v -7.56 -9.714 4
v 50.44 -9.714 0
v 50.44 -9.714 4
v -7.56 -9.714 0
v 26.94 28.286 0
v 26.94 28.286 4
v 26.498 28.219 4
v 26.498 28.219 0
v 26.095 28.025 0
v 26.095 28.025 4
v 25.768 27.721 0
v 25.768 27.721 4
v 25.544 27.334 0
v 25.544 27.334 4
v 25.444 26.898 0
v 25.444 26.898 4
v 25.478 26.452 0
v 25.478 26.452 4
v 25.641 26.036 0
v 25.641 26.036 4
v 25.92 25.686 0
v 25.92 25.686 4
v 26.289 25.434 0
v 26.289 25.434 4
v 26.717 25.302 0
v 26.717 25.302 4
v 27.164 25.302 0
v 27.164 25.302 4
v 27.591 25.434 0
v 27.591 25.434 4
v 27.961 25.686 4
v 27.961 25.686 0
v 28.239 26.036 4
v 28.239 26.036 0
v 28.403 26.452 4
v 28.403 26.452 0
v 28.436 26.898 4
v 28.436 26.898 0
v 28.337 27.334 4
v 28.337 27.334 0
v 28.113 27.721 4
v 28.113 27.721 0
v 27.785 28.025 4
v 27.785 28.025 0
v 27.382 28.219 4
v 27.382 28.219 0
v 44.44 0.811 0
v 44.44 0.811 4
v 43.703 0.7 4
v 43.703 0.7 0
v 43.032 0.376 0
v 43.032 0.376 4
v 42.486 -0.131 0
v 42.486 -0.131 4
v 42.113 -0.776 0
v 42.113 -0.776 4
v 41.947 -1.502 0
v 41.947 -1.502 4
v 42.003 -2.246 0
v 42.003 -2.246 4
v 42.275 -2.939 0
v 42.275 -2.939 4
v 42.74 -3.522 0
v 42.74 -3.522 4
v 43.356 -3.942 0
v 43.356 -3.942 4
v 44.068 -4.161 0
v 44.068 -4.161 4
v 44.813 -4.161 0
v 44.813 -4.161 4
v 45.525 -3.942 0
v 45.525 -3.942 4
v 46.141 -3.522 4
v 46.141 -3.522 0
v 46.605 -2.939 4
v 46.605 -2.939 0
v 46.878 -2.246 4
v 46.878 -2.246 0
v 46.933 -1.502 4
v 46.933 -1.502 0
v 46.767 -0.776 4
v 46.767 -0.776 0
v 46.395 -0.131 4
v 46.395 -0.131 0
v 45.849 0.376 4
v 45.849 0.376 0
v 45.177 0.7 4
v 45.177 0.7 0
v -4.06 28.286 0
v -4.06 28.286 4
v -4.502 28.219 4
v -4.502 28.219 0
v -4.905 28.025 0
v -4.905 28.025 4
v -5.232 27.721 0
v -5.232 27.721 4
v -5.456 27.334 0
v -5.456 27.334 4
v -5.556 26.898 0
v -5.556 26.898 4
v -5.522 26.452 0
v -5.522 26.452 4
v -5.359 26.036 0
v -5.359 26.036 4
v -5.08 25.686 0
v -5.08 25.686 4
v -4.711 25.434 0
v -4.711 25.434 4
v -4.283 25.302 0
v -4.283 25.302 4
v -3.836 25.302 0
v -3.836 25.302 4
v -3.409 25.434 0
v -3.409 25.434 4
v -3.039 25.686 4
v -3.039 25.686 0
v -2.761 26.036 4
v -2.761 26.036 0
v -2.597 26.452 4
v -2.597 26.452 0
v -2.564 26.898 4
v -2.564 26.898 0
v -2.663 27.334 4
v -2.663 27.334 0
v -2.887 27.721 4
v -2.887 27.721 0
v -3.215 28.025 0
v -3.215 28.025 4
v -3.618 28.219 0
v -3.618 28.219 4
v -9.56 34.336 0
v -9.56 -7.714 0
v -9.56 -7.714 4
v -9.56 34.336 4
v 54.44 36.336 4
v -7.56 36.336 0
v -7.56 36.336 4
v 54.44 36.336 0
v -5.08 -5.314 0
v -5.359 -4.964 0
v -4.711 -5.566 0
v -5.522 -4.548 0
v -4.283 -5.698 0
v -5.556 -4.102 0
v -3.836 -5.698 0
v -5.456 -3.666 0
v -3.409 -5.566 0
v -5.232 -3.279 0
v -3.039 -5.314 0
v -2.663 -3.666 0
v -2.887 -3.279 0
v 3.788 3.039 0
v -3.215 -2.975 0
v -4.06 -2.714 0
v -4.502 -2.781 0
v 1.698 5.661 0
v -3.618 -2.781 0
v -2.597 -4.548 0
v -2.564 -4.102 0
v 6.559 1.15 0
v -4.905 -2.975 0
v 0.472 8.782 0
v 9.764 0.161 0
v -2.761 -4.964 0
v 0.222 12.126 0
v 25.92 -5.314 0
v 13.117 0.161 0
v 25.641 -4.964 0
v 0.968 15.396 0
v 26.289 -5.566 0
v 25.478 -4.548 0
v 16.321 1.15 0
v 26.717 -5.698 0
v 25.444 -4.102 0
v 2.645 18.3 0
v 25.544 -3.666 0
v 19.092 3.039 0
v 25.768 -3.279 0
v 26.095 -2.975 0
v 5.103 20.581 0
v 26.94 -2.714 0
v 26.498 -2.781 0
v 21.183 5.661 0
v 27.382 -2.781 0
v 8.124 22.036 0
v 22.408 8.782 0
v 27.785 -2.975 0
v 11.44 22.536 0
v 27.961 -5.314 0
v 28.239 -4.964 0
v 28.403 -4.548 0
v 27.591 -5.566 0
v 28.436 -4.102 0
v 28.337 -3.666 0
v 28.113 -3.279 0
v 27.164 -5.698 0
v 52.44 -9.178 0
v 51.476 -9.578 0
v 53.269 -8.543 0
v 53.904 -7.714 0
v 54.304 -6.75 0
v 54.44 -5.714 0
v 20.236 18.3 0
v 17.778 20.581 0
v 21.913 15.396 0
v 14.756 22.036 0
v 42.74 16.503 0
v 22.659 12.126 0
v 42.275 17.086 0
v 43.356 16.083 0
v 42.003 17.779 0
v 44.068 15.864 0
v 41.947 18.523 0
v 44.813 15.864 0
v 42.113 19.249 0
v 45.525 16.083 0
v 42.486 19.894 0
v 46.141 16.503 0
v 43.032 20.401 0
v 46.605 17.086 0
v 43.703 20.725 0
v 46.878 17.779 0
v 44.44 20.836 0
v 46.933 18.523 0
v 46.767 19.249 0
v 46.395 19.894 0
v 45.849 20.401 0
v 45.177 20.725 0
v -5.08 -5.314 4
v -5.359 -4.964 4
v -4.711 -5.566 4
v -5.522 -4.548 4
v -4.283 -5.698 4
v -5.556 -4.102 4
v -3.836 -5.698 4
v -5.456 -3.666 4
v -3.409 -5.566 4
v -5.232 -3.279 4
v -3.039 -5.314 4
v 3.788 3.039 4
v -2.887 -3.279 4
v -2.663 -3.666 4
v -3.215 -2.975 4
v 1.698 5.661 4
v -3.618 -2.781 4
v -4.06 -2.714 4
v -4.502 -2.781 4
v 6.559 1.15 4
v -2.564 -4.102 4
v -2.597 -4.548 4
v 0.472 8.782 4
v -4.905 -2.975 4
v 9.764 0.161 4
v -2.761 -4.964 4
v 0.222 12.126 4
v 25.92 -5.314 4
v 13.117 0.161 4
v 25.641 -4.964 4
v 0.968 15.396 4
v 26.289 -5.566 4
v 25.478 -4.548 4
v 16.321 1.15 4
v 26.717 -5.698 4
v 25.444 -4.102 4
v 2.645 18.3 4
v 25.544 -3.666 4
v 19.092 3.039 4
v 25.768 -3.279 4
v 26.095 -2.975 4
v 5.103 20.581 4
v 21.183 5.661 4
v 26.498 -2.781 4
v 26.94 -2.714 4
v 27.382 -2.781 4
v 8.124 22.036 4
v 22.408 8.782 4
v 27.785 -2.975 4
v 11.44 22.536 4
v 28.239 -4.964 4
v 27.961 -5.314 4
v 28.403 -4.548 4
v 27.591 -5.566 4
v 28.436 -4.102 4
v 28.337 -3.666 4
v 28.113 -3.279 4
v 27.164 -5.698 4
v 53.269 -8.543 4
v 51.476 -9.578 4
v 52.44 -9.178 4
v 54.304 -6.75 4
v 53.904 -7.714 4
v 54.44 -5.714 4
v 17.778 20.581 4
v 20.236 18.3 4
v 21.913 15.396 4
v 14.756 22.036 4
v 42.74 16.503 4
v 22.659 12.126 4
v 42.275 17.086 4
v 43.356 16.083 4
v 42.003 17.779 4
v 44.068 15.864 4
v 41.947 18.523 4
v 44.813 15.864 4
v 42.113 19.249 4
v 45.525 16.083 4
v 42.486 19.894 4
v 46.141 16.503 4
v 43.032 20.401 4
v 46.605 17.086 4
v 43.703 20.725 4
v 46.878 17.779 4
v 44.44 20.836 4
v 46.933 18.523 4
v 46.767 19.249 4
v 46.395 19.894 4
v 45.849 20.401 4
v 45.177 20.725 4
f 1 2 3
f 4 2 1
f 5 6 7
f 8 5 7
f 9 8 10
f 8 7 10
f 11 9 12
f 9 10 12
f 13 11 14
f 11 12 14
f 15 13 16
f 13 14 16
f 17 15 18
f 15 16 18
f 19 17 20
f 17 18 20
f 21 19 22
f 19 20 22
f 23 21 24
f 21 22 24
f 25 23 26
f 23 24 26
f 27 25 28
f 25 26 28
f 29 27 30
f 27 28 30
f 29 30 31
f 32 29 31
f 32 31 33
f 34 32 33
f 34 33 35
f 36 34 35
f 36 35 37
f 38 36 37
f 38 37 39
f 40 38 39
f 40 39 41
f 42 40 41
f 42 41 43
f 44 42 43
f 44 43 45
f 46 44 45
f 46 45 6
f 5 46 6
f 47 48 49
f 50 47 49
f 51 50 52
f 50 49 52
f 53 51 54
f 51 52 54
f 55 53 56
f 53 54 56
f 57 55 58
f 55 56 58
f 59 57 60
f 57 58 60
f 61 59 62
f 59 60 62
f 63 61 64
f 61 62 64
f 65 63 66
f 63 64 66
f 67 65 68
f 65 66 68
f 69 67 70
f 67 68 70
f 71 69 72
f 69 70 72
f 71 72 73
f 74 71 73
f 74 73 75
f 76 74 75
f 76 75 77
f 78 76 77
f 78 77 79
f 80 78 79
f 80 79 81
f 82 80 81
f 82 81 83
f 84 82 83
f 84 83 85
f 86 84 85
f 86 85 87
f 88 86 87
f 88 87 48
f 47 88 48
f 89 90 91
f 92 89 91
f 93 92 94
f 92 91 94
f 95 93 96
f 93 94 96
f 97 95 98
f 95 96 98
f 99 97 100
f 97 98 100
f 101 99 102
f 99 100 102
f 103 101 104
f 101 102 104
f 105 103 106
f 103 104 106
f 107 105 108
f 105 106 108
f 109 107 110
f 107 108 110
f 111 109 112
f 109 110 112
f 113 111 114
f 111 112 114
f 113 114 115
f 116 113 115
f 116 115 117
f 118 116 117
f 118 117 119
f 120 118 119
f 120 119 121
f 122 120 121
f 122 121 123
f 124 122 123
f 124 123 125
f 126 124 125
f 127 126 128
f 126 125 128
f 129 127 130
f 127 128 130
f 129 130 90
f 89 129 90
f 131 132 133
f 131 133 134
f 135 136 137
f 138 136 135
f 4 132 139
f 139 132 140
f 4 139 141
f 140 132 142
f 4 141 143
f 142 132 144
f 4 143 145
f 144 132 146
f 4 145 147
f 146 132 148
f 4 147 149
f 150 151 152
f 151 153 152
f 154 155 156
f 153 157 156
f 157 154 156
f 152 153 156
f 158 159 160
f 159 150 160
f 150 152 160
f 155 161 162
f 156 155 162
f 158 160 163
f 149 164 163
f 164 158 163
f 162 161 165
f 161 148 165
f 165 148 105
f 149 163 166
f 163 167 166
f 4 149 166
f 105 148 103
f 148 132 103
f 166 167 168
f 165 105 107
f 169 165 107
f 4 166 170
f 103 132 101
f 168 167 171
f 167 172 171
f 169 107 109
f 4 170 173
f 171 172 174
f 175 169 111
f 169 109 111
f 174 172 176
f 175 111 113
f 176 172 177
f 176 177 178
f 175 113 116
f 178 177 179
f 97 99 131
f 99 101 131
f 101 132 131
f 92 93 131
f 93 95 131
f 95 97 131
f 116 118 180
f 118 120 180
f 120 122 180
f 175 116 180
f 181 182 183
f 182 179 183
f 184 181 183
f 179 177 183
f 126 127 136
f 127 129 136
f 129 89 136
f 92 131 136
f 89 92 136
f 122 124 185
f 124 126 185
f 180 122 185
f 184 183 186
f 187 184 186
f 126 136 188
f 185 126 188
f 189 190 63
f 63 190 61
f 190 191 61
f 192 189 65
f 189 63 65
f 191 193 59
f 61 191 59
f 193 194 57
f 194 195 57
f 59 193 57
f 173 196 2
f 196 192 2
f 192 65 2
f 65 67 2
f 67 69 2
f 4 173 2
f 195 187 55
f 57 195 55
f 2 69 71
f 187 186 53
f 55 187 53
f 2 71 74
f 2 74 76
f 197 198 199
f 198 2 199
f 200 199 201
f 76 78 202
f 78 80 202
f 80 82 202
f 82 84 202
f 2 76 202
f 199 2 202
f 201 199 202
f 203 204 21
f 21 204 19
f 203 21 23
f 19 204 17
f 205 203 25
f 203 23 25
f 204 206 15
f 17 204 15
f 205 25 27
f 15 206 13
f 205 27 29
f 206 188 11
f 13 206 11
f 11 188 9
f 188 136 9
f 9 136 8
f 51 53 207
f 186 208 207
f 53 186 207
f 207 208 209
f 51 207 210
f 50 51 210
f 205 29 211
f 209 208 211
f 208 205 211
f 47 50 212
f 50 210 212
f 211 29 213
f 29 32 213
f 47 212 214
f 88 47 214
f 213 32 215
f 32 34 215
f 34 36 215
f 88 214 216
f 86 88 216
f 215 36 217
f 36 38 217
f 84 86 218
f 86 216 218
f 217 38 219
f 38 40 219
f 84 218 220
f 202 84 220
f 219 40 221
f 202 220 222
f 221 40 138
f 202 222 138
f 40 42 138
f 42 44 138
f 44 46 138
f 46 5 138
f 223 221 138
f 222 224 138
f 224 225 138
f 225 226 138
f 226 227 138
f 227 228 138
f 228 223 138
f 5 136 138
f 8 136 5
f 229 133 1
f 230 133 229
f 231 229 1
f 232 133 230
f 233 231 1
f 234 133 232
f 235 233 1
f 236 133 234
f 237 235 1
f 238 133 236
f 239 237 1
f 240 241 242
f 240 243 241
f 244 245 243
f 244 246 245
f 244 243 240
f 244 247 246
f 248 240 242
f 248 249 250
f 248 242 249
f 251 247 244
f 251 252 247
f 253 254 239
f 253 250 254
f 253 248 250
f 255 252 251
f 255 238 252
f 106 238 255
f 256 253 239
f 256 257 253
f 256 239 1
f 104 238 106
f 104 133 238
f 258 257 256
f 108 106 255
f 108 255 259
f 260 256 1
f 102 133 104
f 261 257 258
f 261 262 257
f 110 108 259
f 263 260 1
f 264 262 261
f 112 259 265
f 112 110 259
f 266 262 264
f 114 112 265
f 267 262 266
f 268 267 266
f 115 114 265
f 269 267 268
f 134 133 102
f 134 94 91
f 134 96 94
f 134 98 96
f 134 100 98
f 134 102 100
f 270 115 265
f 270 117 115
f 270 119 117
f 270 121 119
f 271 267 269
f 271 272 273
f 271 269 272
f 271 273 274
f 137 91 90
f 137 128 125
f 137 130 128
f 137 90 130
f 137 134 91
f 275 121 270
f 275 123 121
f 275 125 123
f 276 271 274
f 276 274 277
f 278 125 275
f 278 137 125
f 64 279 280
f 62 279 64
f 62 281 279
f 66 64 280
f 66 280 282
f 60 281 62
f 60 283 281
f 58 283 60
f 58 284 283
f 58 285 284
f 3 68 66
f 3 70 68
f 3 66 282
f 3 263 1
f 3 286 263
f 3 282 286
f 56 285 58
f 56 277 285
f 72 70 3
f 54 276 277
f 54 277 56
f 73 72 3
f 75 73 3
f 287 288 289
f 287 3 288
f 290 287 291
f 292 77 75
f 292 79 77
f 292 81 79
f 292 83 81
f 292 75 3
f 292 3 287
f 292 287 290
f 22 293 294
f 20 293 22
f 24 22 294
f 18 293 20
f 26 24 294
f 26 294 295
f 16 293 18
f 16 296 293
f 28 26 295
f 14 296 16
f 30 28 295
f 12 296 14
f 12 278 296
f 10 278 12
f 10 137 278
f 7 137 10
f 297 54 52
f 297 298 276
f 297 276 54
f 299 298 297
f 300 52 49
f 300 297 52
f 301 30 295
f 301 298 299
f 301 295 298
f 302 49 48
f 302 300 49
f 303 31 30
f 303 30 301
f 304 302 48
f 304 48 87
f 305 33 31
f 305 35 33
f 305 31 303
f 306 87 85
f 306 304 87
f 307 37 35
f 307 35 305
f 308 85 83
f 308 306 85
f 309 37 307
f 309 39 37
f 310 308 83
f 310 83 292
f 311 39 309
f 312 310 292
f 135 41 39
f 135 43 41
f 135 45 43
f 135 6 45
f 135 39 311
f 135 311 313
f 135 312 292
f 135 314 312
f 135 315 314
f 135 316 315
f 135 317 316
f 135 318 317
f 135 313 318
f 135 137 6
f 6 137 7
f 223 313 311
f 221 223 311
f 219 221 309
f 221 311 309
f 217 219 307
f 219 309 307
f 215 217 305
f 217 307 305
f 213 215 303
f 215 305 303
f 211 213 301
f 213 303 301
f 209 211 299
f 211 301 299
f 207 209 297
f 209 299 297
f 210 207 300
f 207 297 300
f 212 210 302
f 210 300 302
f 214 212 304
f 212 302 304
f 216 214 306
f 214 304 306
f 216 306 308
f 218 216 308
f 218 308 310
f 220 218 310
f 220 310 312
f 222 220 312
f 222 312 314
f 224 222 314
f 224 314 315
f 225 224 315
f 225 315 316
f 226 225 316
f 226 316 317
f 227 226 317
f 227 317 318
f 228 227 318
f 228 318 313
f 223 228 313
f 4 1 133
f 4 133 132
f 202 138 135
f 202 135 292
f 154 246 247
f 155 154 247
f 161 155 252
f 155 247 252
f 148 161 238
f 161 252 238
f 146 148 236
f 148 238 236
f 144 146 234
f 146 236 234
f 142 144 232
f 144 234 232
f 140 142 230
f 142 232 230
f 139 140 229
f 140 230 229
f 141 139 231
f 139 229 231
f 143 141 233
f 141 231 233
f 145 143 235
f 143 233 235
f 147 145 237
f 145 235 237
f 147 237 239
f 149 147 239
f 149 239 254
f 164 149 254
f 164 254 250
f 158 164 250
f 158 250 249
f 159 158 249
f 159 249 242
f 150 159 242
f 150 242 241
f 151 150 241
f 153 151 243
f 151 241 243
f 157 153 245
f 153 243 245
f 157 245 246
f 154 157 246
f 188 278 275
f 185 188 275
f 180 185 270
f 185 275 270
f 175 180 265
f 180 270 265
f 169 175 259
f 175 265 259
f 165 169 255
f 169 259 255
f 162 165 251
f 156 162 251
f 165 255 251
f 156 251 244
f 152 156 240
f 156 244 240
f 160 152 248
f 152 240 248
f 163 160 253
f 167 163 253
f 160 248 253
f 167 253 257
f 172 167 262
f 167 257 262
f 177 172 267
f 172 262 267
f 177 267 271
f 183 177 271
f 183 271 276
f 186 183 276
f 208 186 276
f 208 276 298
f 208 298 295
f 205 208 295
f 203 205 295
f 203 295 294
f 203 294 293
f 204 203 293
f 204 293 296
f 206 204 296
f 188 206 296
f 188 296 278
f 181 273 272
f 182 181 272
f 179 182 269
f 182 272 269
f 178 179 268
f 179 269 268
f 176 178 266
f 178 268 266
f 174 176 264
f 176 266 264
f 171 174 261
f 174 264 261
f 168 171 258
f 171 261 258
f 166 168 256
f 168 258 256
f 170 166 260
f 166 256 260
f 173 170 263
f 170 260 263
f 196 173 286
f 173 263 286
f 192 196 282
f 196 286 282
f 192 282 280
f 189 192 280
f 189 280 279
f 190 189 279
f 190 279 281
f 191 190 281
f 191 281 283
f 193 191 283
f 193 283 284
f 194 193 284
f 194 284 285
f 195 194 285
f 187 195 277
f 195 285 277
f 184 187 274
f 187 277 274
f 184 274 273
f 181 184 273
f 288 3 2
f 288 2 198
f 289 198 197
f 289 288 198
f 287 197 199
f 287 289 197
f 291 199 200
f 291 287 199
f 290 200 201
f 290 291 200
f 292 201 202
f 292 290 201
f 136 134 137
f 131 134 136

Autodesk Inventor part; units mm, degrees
ref_plane "YZ Plane" through (0, 0, 0) normal (1, 0, 0) x (0, 1, 0)
ref_plane "XZ Plane" through (0, 0, 0) normal (0, 1, 0) x (-1, 0, 0)
ref_plane "XY Plane" through (0, 0, 0) normal (0, 0, 1) x (1, 0, 0)
sketch "Szkic1" plane through (0, 0, 0) normal (0, 0, 1) x (1, 0, 0)
  line L0 (-9.5597, 36.3357) -> (54.4403, 36.3357)
  line L1 (54.4403, 36.3357) -> (54.4403, -9.7143)
  line L2 (54.4403, -9.7143) -> (-9.5597, -9.7143)
  line L3 (-9.5597, -9.7143) -> (-9.5597, 36.3357)
  point P0 (0, 0)
  point P1 (-4.0597, 26.7857)
  point P2 (26.9403, 26.7857)
  point P3 (-4.0597, -4.2143)
  point P4 (26.9403, -4.2143)
  point P5 (11.4403, 11.2857)
  point P6 (44.4403, 18.3357)
  point P7 (44.4403, -1.6893)
  dimension "d0" = 46.05
  dimension "d1" = 64
  dimension "d2" = 15.5
  dimension "d3" = 15.5
  dimension "d4" = 15.5
  dimension "d5" = 15.5
  dimension "d6" = 15.5
  dimension "d7" = 15.5
  dimension "d8" = 15.5
  dimension "d9" = 15.5
  dimension "d11" = 43
  dimension "d12" = 25.05
  dimension "d33" = 10
  dimension "d34" = 10
  dimension "d35" = 8.025
  dimension "d37" = 18
extrude "Wyciągnięcie proste1" add sketch "Szkic1" along normal blind 4
hole "Otwór1" at (11.4403, 11.2857, 0) direction (0, 0, 1) diameter 22.5 end through all
hole "Otwór2" at (26.9403, -4.2143, 0) at (-4.0597, -4.2143, 0) at (26.9403, 26.7857, 0) at (-4.0597, 26.7857, 0) direction (0, 0, 1) diameter 3 end through all
chamfer "Faza1" distance 2 angle 45 2 edges at (-9.5597, 36.3357, 2) (-9.5597, -9.7143, 2)
fillet "Zaokrąglenie1" radius 4 1 edges at (54.4403, -9.7143, 2)
hole "Otwór3" at (44.4403, 18.3357, 0) at (44.4403, -1.6893, 0) direction (0, 0, 1) diameter 5 end through all
equation "\"d2\" = 0.5 * d10"
equation "\"d3\" = d2"
equation "\"d4\" = d2"
equation "\"d34\" = d33"
equation "\"d10\" = 31"
properties part number "LC_ALU_4mm_Z_Axis_Motor_Mount"
